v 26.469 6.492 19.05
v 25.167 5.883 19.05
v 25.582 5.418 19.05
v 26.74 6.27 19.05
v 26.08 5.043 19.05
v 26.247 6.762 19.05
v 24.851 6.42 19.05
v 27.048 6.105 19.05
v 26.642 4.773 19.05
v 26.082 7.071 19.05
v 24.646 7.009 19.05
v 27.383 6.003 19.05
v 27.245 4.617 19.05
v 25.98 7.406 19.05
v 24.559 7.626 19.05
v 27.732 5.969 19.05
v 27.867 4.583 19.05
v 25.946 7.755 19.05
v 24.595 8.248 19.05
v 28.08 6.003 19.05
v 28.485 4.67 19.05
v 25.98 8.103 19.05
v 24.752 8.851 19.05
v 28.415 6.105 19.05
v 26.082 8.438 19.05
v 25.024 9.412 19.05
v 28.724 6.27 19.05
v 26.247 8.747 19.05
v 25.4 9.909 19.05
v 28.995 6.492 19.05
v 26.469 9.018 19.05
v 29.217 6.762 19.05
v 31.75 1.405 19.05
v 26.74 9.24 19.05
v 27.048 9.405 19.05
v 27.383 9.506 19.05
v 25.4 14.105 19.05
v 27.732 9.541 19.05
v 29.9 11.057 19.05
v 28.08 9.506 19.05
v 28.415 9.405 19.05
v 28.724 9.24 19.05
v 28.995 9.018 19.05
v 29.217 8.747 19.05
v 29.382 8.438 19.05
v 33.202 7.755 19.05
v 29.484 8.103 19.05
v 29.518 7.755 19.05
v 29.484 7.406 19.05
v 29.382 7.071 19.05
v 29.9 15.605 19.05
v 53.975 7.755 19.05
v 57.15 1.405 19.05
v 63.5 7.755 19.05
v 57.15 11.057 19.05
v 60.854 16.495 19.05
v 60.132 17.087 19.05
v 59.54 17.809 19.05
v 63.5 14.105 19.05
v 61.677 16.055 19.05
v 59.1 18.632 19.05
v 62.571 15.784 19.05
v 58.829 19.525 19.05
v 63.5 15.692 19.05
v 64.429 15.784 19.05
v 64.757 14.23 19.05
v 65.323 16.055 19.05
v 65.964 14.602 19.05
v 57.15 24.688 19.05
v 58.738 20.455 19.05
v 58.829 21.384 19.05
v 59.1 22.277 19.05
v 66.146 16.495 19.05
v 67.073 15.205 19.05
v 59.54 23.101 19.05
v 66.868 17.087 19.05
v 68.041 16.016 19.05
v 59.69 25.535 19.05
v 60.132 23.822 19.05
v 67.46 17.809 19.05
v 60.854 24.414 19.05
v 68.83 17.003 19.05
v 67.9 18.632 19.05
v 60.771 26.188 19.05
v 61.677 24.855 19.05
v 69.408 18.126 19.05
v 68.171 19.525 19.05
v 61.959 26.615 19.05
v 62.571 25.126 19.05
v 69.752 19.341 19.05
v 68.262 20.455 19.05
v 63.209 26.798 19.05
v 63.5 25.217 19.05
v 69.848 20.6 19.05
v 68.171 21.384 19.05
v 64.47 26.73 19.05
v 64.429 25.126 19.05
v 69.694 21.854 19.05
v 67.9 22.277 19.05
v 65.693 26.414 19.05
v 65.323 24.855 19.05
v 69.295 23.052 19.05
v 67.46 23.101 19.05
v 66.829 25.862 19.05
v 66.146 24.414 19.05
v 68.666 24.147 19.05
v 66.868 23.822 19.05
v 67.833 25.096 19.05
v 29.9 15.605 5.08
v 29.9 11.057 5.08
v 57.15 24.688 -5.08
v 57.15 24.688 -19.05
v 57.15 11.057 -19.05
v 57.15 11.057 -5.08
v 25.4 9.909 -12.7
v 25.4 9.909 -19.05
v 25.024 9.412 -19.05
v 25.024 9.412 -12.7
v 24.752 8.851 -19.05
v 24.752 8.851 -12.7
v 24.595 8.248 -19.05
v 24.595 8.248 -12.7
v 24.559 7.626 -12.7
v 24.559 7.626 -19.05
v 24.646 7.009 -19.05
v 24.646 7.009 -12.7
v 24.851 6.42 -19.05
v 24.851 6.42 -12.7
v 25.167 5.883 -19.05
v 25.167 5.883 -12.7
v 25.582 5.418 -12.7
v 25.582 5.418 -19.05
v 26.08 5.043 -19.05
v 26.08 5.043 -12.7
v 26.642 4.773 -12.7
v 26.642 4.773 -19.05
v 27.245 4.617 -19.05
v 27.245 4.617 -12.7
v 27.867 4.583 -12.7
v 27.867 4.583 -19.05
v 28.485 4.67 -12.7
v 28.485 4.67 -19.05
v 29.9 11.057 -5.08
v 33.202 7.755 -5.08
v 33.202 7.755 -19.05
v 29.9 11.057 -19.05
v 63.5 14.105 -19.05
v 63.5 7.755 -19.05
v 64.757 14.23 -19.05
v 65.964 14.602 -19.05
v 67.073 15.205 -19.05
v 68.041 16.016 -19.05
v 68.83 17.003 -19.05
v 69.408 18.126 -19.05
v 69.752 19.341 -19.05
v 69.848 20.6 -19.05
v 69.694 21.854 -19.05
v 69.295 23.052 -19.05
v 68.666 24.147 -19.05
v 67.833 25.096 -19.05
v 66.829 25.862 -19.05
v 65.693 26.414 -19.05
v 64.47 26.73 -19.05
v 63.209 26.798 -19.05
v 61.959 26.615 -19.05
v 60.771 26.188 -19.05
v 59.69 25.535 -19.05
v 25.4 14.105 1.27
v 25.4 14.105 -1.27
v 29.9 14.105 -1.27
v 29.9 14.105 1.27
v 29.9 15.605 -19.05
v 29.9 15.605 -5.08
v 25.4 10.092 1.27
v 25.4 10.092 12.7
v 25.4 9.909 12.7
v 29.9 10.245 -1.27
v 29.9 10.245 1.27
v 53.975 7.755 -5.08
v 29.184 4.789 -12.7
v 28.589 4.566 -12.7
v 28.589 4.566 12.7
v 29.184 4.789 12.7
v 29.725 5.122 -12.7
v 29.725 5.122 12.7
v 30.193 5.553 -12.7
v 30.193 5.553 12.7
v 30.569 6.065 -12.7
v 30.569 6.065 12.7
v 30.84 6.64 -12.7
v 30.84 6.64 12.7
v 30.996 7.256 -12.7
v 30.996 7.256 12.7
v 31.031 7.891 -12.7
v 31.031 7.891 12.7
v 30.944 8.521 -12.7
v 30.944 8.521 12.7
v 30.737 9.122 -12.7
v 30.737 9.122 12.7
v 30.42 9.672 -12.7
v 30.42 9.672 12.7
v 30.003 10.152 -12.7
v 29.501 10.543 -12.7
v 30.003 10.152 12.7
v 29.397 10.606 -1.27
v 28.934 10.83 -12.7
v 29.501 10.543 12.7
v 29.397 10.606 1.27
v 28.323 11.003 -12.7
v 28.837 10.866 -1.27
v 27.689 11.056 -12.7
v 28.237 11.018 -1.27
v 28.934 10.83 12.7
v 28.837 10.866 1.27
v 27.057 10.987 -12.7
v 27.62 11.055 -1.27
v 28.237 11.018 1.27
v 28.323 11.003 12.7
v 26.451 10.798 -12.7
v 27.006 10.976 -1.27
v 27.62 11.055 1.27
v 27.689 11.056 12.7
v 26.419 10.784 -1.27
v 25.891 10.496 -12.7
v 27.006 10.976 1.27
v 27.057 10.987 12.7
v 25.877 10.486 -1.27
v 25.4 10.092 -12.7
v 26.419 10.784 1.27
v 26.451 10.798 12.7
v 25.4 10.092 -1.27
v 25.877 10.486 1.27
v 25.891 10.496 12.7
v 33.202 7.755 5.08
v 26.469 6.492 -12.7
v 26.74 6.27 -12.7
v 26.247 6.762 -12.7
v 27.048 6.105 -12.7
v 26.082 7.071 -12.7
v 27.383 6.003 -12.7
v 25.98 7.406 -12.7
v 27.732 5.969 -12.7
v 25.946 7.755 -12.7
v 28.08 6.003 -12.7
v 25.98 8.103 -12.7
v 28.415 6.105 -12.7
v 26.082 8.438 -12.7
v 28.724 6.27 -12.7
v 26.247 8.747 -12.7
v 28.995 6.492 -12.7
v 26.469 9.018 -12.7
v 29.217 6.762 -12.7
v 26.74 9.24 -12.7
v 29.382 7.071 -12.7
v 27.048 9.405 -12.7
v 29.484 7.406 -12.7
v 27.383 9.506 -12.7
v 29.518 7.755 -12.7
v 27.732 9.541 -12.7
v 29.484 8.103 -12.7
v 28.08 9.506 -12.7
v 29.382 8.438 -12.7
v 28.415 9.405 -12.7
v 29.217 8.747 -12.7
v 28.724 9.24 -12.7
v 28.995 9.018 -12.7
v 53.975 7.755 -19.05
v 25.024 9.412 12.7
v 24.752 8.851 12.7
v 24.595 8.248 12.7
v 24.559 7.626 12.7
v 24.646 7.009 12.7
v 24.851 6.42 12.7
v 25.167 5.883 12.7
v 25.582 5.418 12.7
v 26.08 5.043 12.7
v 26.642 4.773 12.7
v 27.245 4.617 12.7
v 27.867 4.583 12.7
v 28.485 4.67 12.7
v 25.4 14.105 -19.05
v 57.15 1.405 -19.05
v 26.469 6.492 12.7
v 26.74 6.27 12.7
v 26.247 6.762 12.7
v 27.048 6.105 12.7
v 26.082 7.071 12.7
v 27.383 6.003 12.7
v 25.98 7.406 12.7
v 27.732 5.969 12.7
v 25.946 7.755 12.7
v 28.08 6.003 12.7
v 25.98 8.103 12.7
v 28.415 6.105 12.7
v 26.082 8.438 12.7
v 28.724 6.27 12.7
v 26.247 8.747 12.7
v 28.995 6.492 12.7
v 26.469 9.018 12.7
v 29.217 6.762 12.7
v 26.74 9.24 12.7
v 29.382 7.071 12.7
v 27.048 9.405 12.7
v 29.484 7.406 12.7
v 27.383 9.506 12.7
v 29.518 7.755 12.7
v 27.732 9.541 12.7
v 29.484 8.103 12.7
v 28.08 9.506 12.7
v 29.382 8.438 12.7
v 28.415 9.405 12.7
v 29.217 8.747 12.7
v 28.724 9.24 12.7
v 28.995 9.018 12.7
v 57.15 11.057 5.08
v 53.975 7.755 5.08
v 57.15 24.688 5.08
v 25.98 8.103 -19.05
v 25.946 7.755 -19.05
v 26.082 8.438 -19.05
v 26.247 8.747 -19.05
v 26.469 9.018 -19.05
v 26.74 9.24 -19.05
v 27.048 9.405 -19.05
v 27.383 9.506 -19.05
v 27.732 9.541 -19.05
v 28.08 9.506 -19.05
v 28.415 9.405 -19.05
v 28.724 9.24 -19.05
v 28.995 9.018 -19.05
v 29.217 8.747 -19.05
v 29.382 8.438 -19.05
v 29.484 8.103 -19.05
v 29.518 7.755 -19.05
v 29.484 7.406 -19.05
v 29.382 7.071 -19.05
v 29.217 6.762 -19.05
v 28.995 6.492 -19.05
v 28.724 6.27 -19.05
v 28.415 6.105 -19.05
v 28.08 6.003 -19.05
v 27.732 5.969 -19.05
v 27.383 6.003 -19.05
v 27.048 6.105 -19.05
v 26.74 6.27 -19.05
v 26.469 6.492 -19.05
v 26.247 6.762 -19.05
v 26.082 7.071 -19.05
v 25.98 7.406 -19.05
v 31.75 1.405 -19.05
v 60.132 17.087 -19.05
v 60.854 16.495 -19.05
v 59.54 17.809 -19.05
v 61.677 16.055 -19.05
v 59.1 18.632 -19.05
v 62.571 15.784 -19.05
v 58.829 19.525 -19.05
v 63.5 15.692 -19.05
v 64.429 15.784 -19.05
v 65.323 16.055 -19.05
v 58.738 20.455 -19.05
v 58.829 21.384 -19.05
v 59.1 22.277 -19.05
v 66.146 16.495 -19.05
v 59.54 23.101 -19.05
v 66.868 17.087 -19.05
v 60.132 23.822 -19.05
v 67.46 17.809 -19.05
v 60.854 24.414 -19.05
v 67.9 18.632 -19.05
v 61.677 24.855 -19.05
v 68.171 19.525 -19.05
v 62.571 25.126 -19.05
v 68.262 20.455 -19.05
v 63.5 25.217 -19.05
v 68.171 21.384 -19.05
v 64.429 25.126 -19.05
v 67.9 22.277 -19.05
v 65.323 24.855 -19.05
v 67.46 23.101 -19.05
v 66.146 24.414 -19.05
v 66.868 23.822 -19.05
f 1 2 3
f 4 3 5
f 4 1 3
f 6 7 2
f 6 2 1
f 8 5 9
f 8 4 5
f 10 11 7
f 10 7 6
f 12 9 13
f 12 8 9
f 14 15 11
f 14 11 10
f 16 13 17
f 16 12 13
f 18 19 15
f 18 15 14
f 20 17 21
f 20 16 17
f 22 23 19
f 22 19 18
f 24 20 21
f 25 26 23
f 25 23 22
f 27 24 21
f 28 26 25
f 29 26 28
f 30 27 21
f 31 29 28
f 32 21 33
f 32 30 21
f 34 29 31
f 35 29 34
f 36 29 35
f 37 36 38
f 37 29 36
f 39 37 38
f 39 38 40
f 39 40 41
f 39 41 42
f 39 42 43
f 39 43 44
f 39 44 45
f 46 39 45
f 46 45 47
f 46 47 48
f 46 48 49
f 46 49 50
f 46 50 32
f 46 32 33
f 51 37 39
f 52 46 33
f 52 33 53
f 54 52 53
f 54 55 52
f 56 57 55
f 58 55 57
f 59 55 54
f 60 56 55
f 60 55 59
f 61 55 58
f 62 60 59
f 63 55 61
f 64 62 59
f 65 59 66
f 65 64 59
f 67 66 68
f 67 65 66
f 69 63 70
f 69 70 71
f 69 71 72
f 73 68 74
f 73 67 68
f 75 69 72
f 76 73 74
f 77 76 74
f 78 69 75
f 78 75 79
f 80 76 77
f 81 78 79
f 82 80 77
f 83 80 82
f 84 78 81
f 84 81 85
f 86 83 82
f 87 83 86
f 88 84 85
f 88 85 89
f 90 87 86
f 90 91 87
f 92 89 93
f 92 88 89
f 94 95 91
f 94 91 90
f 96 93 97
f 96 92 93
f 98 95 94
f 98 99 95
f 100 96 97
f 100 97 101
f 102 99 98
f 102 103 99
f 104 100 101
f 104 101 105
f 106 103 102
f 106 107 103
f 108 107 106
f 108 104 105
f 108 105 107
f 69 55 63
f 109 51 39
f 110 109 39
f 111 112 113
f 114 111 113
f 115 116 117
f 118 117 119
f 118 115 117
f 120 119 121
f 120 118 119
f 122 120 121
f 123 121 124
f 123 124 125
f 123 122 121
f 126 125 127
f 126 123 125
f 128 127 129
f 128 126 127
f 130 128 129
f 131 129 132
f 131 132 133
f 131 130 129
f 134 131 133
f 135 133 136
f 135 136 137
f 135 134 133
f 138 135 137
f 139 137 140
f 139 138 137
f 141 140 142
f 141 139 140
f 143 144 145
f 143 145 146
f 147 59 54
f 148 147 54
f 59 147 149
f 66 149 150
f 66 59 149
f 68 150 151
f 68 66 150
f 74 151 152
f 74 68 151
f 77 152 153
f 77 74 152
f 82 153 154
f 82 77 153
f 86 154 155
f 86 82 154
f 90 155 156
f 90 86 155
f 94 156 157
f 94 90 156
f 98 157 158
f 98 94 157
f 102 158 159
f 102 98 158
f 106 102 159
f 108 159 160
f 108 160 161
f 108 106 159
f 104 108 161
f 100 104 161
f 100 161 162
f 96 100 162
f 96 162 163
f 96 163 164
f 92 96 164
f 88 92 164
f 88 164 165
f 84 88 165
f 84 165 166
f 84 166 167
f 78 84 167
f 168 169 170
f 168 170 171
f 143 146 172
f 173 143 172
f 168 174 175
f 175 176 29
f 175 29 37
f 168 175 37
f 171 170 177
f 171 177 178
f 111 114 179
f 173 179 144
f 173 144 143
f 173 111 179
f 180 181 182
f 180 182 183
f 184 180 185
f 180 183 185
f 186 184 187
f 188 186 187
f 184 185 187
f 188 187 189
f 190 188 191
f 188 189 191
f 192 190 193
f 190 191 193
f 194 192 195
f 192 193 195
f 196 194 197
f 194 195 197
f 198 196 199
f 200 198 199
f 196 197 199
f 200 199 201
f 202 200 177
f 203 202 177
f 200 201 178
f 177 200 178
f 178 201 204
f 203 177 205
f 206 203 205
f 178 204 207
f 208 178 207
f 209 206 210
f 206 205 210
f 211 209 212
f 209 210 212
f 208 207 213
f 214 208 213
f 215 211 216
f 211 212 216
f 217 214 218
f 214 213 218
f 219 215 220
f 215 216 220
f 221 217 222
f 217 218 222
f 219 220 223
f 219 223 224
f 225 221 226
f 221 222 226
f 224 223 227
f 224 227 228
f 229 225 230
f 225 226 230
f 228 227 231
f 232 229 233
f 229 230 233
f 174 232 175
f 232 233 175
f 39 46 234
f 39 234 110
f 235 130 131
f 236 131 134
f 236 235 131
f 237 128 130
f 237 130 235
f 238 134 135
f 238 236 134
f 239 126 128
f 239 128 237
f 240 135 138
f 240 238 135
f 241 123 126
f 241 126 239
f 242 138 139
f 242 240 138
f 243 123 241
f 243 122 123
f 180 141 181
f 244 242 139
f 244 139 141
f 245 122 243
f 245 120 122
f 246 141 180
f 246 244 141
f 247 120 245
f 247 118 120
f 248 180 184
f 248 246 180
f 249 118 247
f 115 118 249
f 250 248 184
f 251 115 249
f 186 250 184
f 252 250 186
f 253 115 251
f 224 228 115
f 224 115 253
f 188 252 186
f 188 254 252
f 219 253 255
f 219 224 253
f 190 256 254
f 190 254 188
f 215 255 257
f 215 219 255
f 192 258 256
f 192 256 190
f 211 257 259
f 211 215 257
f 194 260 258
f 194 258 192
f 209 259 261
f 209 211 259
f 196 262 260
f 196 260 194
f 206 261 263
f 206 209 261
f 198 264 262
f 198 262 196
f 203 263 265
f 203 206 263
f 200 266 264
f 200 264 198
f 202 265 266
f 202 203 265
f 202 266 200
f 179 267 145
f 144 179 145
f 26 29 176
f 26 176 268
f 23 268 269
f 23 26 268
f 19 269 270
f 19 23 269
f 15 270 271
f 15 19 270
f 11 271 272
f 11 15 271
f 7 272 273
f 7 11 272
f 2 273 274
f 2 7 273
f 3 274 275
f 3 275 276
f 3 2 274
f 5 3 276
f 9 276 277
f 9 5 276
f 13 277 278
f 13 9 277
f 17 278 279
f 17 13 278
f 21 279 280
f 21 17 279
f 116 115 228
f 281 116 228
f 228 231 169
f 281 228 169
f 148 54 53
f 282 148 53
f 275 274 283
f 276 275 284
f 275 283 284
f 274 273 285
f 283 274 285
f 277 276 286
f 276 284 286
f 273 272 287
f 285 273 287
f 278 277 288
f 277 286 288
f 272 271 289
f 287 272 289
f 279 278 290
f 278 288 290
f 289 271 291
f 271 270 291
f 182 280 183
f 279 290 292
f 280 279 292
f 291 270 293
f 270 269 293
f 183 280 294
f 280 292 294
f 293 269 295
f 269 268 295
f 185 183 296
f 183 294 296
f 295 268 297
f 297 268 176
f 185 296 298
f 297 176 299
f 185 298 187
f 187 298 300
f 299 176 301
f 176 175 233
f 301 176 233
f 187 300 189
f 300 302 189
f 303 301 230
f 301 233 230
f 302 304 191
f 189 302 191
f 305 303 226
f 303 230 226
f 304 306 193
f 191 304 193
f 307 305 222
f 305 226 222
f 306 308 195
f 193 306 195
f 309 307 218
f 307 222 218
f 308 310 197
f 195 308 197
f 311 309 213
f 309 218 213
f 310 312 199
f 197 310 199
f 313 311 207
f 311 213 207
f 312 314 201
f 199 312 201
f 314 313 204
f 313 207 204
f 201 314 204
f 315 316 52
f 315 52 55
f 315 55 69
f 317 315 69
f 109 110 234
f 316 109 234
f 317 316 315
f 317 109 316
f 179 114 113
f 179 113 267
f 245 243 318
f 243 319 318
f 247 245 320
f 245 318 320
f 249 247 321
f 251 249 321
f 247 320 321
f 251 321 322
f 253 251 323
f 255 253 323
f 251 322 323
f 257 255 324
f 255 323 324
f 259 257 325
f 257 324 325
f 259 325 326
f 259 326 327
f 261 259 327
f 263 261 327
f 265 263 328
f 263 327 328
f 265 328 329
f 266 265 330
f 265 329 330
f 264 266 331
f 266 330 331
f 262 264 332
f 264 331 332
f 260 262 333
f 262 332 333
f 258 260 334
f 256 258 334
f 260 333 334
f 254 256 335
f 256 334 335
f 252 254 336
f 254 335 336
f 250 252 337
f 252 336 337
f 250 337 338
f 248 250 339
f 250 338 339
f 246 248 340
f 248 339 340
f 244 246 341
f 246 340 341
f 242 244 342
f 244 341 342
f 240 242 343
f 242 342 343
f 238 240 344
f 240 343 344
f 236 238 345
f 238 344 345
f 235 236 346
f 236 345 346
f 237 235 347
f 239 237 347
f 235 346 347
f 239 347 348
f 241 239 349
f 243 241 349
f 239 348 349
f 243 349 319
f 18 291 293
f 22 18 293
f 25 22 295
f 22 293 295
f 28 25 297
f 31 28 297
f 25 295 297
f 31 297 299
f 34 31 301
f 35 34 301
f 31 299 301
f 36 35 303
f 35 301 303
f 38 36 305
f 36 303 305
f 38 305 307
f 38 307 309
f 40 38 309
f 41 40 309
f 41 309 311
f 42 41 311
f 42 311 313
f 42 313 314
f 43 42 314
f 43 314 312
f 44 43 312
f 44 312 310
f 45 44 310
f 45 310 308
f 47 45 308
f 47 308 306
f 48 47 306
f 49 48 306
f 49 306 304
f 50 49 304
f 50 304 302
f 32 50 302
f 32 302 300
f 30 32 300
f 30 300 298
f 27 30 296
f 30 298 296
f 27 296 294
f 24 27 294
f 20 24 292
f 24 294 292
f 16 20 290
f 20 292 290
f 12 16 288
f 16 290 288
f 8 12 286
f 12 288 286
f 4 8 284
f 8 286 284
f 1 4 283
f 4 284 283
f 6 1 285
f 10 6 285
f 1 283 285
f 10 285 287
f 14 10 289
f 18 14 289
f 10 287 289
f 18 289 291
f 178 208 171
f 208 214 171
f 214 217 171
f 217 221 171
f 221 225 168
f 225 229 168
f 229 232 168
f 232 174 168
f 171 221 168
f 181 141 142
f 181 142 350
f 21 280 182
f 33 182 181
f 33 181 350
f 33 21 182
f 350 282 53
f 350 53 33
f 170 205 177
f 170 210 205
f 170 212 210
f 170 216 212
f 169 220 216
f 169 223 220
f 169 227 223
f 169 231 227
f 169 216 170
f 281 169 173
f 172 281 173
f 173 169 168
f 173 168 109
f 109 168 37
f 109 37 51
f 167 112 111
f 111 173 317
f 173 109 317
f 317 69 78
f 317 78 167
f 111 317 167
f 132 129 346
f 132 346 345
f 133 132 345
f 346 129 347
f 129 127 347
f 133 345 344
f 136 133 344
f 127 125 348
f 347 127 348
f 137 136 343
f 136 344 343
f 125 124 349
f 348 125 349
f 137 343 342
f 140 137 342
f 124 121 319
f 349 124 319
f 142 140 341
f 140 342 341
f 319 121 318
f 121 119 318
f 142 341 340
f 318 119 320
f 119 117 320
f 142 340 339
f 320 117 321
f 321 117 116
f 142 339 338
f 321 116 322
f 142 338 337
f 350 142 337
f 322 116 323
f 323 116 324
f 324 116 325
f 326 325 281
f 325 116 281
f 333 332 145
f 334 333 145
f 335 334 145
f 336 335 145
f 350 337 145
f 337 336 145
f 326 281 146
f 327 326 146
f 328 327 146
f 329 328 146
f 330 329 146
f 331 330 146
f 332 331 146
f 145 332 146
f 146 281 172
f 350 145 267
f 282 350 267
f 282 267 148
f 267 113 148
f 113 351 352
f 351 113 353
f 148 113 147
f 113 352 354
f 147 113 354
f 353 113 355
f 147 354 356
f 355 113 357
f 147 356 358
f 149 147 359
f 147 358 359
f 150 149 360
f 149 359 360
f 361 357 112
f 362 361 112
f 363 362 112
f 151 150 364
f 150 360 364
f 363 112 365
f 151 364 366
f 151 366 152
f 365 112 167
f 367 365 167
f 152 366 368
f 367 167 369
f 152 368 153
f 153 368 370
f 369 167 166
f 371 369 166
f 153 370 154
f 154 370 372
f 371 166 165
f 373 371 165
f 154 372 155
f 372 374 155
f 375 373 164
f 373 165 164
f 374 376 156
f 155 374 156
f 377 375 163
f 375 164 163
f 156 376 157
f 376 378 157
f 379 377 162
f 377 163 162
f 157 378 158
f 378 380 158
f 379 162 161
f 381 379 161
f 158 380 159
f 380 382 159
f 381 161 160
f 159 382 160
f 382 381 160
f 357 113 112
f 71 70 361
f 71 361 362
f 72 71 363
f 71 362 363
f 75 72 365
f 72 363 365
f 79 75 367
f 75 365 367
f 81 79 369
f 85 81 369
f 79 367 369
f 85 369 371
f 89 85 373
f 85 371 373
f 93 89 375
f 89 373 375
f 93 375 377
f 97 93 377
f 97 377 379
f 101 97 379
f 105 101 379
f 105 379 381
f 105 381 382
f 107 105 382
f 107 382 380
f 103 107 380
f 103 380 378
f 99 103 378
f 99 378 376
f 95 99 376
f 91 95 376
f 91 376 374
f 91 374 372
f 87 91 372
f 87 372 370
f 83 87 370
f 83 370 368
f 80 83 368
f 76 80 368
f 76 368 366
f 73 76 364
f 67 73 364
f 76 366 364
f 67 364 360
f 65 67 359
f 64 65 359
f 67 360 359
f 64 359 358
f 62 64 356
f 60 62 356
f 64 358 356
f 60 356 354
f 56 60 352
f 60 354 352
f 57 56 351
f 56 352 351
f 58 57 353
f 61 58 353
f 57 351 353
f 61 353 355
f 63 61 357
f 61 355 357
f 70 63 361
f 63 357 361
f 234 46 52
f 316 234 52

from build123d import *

# Parameters (mm, degrees)
BOSS_EXTRUDE1_DEPTH             = 19.05
BOSS_EXTRUDE1_DEPTH_BACK        = 19.05
SKETCH5_R                       = 6.35
BOSS_EXTRUDE2_DEPTH             = 38.1
F_3_8_0_375_DIAMETER_HOLE1_D    = 9.525
CUT_EXTRUDE2_DEPTH              = 38.1
CUT_EXTRUDE5_DEPTH              = 13.97
CUT_EXTRUDE6_DEPTH              = 13.97
CUT_EXTRUDE7_DEPTH              = 39.1
BOSS_EXTRUDE5_DEPTH             = 38.1
BOSS_EXTRUDE6_DEPTH             = 38.1
F_9_64_0_14063_DIAMETER_HOLE2_D = 3.572002
SKETCH25_R                      = 3.302
CUT_EXTRUDE8_DEPTH              = 12.7
CUT_EXTRUDE8_DEPTH_BACK         = 12.7
SKETCH28_W                      = 2.54
SKETCH28_H                      = 4.012120109
CUT_EXTRUDE9_DEPTH              = 4.499728


with BuildPart() as part:
    # Sketch4 → Boss-Extrude1 (new body, two sides)
    with BuildSketch(Plane.XY) as boss_extrude1_sk:
        Polygon((25.4, 1.404612262), (25.4, 14.104612262), (63.5, 26.804612262), (63.5, 1.404612262), align=None)
    extrude(amount=BOSS_EXTRUDE1_DEPTH)
    extrude(boss_extrude1_sk.sketch, amount=-BOSS_EXTRUDE1_DEPTH_BACK)

    # Sketch5 → Boss-Extrude2 (add)
    with BuildSketch(Plane.XY.offset(19.05)):
        with Locations((63.5, 20.454612262)):
            Circle(SKETCH5_R)
    extrude(amount=-BOSS_EXTRUDE2_DEPTH)

    # 3/8 (0.375) Diameter Hole1 (through all)
    with Locations(Plane.XY.offset(19.05)):
        with Locations((63.5, 20.454612262)):
            Hole(F_3_8_0_375_DIAMETER_HOLE1_D / 2)

    # Sketch11 → Cut-Extrude2 (cut)
    with BuildSketch(Plane.XY.offset(19.05)):
        Polygon((63.5, 7.754612262), (57.15, 1.404612262), (63.5, 1.404612262), align=None)
    extrude(amount=-CUT_EXTRUDE2_DEPTH, mode=Mode.SUBTRACT)

    # Sketch20 → Cut-Extrude5 (cut)
    with BuildSketch(Plane.XY.offset(19.05)):
        Polygon((29.899727951, 7.754612262), (53.975, 7.754612262), (57.15, 11.056612262), (57.15, 24.687945595), (29.899727951, 15.604521579), align=None)
    extrude(amount=-CUT_EXTRUDE5_DEPTH, mode=Mode.SUBTRACT)

    # Sketch21 → Cut-Extrude6 (cut)
    with BuildSketch(Plane(origin=(0, 0, -19.05), x_dir=(-1, 0, 0), z_dir=(0, 0, -1))):
        Polygon((-57.15, 24.687945595), (-57.15, 11.056612262), (-53.975, 7.754612262), (-29.899727951, 7.754612262), (-29.899727951, 15.604521579), align=None)
    extrude(amount=-CUT_EXTRUDE6_DEPTH, mode=Mode.SUBTRACT)

    # Sketch11<4> → Cut-Extrude7 (cut, through all)
    with BuildSketch(Plane.XY.offset(19.05)):
        Polygon((25.4, 7.754612262), (31.75, 1.404612262), (25.4, 1.404612262), align=None)
    extrude(amount=-CUT_EXTRUDE7_DEPTH, mode=Mode.SUBTRACT)

    # Sketch22 → Boss-Extrude5 (add)
    with BuildSketch(Plane.XY.offset(19.05)):
        Polygon((33.201727951, 7.754612262), (29.899727951, 11.056612262), (29.899727951, 7.754612262), align=None)
    extrude(amount=-BOSS_EXTRUDE5_DEPTH)

    # Sketch23 → Boss-Extrude6 (add)
    with BuildSketch(Plane.XY.offset(19.05)):
        with BuildLine():
            ThreePointArc((28.484500237, 4.670112024), (30.228876772, 5.793622896), (30.906849398, 7.754612262))
            ThreePointArc((30.906849398, 7.754612262), (28.888785689, 10.711320469), (25.4, 9.909398419))
            Line((25.4, 9.909398419), (25.4, 7.754612262))
            Line((25.4, 7.754612262), (28.484500237, 4.670112024))
        make_face()
        with BuildLine():
            Line((25.4, 7.754612262), (25.4, 9.909398419))
            ThreePointArc((25.4, 9.909398419), (24.9957943, 6.143827516), (28.484500237, 4.670112024))
            Line((28.484500237, 4.670112024), (25.4, 7.754612262))
        make_face()
    extrude(amount=-BOSS_EXTRUDE6_DEPTH)

    # 9/64 (0.14063) Diameter Hole2 (through all)
    with Locations(Plane(origin=(27.731849398, 7.754612262, 19.05), x_dir=(1, 0, 0), z_dir=(0, 0, 1))):
        with Locations((0, 0)):
            Hole(F_9_64_0_14063_DIAMETER_HOLE2_D / 2)

    # Sketch25 → Cut-Extrude8 (cut, two sides)
    with BuildSketch(Plane.XY) as cut_extrude8_sk:
        with Locations((27.731849398, 7.754612262)):
            Circle(SKETCH25_R)
    extrude(amount=CUT_EXTRUDE8_DEPTH, mode=Mode.SUBTRACT)
    extrude(cut_extrude8_sk.sketch, amount=-CUT_EXTRUDE8_DEPTH_BACK, mode=Mode.SUBTRACT)

    # Sketch28 → Cut-Extrude9 (cut)
    with BuildSketch(Plane.ZY.offset(-25.4)):
        with Locations((0, 12.098552208)):
            Rectangle(SKETCH28_W, SKETCH28_H)
    extrude(amount=-CUT_EXTRUDE9_DEPTH, mode=Mode.SUBTRACT)


solid = part.part
